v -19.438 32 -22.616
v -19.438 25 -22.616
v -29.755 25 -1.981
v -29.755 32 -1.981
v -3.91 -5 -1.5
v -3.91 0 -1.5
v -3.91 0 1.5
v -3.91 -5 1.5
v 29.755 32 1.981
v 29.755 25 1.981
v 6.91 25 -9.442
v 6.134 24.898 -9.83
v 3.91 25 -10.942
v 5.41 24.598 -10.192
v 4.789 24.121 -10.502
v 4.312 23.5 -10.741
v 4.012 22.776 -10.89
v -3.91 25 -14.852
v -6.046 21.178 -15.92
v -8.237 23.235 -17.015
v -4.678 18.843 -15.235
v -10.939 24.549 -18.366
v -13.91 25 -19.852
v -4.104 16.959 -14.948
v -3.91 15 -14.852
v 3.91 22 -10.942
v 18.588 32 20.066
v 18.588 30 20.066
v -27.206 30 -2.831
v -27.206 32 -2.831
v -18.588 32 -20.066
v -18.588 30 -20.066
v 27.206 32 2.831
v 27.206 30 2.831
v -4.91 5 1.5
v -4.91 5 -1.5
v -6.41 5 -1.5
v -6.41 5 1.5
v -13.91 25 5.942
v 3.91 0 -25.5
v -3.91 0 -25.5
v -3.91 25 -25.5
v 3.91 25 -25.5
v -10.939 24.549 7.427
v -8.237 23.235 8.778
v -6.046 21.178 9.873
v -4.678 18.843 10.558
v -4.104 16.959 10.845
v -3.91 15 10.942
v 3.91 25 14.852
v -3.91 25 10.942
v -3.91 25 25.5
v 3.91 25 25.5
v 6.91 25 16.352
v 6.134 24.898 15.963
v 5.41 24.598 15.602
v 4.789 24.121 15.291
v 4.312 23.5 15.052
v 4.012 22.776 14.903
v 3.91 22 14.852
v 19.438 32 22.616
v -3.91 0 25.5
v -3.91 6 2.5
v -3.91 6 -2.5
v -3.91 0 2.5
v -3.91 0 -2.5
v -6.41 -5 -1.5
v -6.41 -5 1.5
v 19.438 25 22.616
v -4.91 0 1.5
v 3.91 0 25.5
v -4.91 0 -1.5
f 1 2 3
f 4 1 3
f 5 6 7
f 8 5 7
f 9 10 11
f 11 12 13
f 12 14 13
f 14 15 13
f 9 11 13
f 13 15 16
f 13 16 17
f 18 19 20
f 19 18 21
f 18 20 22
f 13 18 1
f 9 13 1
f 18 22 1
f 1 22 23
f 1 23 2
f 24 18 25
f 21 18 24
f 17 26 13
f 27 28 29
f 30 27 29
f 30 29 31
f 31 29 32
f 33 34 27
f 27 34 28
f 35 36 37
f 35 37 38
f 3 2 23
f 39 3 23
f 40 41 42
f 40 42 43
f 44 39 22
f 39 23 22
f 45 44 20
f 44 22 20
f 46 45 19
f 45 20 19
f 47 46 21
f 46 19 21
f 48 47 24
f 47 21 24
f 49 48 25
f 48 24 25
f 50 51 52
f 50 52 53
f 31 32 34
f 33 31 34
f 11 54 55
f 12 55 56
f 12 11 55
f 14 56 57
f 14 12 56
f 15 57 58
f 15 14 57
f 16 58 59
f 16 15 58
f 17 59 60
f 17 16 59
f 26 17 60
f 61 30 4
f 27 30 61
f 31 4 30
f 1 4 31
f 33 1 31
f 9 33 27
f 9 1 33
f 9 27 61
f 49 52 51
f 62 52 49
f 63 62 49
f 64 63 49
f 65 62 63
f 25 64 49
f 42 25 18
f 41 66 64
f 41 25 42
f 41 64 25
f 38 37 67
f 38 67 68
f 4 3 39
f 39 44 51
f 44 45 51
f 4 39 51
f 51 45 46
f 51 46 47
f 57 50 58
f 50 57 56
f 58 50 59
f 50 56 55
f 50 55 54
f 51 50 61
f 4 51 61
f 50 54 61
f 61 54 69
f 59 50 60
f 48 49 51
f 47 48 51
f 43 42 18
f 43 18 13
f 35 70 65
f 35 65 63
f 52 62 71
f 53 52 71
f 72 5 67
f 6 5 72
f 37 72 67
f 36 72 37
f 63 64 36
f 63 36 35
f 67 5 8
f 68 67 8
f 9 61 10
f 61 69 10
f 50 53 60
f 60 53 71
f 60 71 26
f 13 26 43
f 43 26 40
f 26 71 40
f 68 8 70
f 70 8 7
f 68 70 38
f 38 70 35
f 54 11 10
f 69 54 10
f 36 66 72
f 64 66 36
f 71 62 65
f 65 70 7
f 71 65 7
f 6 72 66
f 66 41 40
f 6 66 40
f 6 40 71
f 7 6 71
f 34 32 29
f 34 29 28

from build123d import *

# Parameters (mm, degrees)
SKETCH1_W           = 7.82
SKETCH1_H           = 51
BOSS_EXTRUDE1_DEPTH = 25
BOSS_EXTRUDE2_DEPTH = 5
BOSS_EXTRUDE3_DEPTH = 2
FILLET1_R           = 10
FILLET2_R           = 3
SKETCH4_W           = 3
SKETCH4_H           = 10
BOSS_EXTRUDE4_DEPTH = 2.5
CHAMFER1_SIZE       = 1


with BuildPart() as part:
    # Sketch1 → Boss-Extrude1 (new body)
    with BuildSketch(Plane(origin=(0, 0, 0), x_dir=(1, 0, 0), z_dir=(0, 1, 0))):
        Rectangle(SKETCH1_W, SKETCH1_H)
    extrude(amount=BOSS_EXTRUDE1_DEPTH)

    # Sketch2 → Boss-Extrude2 (add)
    with BuildSketch(Plane(origin=(0, 25, 0), x_dir=(1, 0, 0), z_dir=(0, 1, 0))):
        Polygon((-29.755356576, 1.98115624), (19.438138919, -22.615591532), (29.755356576, -1.98115624), (-19.438138919, 22.615591532), align=None)
    extrude(amount=BOSS_EXTRUDE2_DEPTH)

    # Sketch3 → Boss-Extrude3 (add)
    with BuildSketch(Plane(origin=(0, 30, 0), x_dir=(1, 0, 0), z_dir=(0, 1, 0))):
        Polygon((-29.755356576, 1.98115624), (19.438138919, -22.615591532), (29.755356576, -1.98115624), (-19.438138919, 22.615591532), align=None)
        Polygon((18.588433089, -20.066474038), (-27.206239081, 2.83086207), (-18.588433089, 20.066474038), (27.206239081, -2.83086207), align=None, mode=Mode.SUBTRACT)
    extrude(amount=BOSS_EXTRUDE3_DEPTH)

    # Fillet1
    fillet1_edges = [part.edges().sort_by_distance(p)[0] for p in [
        (-3.91, 25, -1.955000002),
    ]]
    fillet(fillet1_edges, radius=FILLET1_R)

    # Fillet2
    fillet2_edges = [part.edges().sort_by_distance(p)[0] for p in [
        (3.91, 25, 1.955000002),
    ]]
    fillet(fillet2_edges, radius=FILLET2_R)

    # Sketch4 → Boss-Extrude4 (add)
    with BuildSketch(Plane.ZY.offset(3.91)):
        Rectangle(SKETCH4_W, SKETCH4_H)
    extrude(amount=BOSS_EXTRUDE4_DEPTH)

    # Chamfer1
    chamfer1_edges = [part.edges().sort_by_distance(p)[0] for p in [
        (-3.91, 2.5, 1.5),
        (-3.91, 5, 0),
        (-3.91, 2.5, -1.5),
    ]]
    chamfer(chamfer1_edges, length=CHAMFER1_SIZE)


solid = part.part
